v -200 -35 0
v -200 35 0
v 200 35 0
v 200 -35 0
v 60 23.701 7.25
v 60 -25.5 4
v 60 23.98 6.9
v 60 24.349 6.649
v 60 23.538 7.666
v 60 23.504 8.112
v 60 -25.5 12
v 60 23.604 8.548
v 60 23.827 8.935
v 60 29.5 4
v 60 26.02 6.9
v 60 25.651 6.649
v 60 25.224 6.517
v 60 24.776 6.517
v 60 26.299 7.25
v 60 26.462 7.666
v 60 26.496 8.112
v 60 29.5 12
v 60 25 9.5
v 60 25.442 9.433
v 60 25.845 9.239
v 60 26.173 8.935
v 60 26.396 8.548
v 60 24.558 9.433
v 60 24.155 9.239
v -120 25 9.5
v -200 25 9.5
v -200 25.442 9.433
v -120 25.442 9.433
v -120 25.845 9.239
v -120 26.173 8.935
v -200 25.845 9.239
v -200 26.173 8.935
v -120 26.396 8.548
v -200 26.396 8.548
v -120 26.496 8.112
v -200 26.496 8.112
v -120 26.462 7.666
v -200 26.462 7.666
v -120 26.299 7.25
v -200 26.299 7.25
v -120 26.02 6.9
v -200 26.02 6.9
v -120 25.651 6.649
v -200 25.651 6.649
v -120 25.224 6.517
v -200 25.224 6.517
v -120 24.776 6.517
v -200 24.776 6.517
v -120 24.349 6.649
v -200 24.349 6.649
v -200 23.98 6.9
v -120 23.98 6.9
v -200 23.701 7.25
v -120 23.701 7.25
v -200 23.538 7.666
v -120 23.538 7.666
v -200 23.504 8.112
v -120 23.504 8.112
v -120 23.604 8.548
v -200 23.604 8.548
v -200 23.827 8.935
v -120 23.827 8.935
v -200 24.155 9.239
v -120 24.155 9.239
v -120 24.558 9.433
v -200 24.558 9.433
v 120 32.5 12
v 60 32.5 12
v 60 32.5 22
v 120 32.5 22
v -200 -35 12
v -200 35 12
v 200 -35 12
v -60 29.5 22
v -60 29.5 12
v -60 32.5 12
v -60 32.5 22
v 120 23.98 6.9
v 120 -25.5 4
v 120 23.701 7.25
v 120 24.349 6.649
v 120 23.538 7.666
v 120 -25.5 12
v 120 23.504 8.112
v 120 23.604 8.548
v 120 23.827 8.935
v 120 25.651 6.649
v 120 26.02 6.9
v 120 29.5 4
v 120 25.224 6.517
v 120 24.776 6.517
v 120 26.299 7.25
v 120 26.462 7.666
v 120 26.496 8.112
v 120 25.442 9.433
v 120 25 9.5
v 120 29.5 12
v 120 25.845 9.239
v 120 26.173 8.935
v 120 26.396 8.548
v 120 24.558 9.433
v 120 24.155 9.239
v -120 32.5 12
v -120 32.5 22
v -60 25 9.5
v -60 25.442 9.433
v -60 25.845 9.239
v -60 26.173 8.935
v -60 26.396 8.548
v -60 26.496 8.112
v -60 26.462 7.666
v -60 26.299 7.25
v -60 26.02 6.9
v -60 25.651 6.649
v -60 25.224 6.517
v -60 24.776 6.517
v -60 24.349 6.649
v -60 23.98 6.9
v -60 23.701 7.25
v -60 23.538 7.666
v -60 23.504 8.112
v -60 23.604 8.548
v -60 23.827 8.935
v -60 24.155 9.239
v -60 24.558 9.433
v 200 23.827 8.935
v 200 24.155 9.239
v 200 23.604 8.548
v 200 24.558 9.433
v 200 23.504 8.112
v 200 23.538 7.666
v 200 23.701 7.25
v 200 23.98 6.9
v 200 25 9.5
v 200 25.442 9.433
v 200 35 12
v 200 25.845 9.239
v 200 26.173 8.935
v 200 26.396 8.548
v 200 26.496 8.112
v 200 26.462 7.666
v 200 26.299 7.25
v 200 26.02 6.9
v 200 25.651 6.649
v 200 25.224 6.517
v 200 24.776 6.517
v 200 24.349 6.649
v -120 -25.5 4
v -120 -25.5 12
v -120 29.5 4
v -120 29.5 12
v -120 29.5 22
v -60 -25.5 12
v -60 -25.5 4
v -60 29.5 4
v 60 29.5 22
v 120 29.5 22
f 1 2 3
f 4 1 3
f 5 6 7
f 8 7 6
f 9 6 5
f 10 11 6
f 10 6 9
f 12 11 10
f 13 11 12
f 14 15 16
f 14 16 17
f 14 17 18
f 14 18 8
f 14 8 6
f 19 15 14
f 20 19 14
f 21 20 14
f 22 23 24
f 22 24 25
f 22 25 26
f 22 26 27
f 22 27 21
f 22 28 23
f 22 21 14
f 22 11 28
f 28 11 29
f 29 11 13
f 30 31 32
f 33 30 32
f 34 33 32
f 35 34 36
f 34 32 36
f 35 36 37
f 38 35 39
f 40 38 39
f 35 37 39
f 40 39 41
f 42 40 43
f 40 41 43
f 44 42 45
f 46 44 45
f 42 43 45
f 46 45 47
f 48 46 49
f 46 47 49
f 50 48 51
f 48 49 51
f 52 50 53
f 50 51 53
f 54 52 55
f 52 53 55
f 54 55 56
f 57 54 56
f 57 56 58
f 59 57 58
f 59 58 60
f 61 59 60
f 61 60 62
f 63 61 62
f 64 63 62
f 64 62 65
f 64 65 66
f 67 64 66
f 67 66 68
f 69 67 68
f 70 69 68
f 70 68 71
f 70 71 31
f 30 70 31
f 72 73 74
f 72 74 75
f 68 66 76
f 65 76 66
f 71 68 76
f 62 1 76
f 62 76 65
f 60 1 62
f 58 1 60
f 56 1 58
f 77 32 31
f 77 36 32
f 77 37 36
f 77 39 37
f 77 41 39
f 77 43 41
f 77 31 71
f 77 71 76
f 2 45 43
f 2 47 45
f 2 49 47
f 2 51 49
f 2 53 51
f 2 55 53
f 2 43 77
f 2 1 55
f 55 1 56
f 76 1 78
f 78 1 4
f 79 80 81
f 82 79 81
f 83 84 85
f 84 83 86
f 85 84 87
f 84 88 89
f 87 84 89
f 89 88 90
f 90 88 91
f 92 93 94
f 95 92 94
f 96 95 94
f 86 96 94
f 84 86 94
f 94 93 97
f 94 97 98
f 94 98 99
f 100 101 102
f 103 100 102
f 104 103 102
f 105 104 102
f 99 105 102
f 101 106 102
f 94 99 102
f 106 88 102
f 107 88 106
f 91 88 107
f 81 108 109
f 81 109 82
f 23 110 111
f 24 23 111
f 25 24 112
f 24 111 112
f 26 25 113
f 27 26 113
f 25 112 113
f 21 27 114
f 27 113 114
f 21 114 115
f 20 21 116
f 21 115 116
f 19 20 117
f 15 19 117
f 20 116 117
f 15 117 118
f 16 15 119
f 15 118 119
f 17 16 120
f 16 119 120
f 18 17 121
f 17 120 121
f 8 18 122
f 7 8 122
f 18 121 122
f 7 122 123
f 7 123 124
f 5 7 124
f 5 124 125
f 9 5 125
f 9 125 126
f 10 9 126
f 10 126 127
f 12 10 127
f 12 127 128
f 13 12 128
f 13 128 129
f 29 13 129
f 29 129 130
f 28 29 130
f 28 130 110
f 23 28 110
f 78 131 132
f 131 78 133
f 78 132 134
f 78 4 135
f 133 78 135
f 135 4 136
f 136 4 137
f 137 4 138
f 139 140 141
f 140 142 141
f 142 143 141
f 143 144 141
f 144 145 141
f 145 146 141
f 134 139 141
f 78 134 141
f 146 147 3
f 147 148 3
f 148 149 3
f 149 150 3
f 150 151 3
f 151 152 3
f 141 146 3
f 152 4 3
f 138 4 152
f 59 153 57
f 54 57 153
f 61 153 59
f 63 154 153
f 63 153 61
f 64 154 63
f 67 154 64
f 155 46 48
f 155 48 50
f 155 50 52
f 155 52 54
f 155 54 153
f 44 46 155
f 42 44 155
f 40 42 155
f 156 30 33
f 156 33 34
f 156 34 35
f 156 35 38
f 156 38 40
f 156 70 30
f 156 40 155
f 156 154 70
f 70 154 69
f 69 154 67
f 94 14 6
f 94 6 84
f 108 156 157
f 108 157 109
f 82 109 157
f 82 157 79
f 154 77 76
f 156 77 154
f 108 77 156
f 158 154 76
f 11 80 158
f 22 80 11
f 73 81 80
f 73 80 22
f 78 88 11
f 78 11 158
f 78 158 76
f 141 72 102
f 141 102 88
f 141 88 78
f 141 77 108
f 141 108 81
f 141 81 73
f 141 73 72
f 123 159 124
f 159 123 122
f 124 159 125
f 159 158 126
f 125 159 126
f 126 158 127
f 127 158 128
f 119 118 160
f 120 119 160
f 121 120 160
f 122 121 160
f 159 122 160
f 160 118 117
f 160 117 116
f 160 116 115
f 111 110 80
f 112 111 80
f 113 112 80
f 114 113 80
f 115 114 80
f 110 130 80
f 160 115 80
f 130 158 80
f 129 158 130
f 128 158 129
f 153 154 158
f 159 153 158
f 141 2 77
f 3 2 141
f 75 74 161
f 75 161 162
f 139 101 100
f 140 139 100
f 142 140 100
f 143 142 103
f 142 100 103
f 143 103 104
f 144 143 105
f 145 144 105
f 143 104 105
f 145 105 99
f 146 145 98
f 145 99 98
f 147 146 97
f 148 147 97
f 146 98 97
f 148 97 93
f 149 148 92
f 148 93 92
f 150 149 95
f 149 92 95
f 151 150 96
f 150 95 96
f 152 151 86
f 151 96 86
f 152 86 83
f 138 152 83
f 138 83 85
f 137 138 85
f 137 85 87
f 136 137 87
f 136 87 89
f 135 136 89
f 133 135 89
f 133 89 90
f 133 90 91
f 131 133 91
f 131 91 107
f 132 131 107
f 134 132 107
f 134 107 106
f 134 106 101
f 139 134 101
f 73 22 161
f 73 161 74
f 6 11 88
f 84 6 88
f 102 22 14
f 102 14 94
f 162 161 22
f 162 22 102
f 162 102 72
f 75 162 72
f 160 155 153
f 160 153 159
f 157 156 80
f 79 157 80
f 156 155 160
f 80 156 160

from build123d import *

# Parameters (mm, degrees)
SKETCH1_W           = 400
SKETCH1_H           = 70
BOSS_EXTRUDE1_DEPTH = 12
SKETCH3_W           = 60
SKETCH3_H           = 55
CUT_EXTRUDE1_DEPTH  = 8
SKETCH4_R           = 1.5
CUT_EXTRUDE2_DEPTH  = 401
SKETCH5_W           = 60
SKETCH5_H           = 3
BOSS_EXTRUDE2_DEPTH = 10


with BuildPart() as part:
    # Sketch1 → Boss-Extrude1 (new body)
    with BuildSketch(Plane.XY):
        Rectangle(SKETCH1_W, SKETCH1_H)
    extrude(amount=BOSS_EXTRUDE1_DEPTH)

    # Sketch3 → Cut-Extrude1 (cut)
    with BuildSketch(Plane.XY.offset(12)):
        with Locations((-90, 2)):
            Rectangle(SKETCH3_W, SKETCH3_H)
        with Locations((90, 2)):
            Rectangle(SKETCH3_W, SKETCH3_H)
    extrude(amount=-CUT_EXTRUDE1_DEPTH, mode=Mode.SUBTRACT)

    # Sketch4 → Cut-Extrude2 (cut, through all)
    with BuildSketch(Plane.ZY.offset(200)):
        with Locations((8, 25)):
            Circle(SKETCH4_R)
    extrude(amount=-CUT_EXTRUDE2_DEPTH, mode=Mode.SUBTRACT)

    # Sketch5 → Boss-Extrude2 (add)
    with BuildSketch(Plane.XY.offset(12)):
        with Locations((-90, 31)):
            Rectangle(SKETCH5_W, SKETCH5_H)
        with Locations((90, 31)):
            Rectangle(SKETCH5_W, SKETCH5_H)
    extrude(amount=BOSS_EXTRUDE2_DEPTH)


solid = part.part
